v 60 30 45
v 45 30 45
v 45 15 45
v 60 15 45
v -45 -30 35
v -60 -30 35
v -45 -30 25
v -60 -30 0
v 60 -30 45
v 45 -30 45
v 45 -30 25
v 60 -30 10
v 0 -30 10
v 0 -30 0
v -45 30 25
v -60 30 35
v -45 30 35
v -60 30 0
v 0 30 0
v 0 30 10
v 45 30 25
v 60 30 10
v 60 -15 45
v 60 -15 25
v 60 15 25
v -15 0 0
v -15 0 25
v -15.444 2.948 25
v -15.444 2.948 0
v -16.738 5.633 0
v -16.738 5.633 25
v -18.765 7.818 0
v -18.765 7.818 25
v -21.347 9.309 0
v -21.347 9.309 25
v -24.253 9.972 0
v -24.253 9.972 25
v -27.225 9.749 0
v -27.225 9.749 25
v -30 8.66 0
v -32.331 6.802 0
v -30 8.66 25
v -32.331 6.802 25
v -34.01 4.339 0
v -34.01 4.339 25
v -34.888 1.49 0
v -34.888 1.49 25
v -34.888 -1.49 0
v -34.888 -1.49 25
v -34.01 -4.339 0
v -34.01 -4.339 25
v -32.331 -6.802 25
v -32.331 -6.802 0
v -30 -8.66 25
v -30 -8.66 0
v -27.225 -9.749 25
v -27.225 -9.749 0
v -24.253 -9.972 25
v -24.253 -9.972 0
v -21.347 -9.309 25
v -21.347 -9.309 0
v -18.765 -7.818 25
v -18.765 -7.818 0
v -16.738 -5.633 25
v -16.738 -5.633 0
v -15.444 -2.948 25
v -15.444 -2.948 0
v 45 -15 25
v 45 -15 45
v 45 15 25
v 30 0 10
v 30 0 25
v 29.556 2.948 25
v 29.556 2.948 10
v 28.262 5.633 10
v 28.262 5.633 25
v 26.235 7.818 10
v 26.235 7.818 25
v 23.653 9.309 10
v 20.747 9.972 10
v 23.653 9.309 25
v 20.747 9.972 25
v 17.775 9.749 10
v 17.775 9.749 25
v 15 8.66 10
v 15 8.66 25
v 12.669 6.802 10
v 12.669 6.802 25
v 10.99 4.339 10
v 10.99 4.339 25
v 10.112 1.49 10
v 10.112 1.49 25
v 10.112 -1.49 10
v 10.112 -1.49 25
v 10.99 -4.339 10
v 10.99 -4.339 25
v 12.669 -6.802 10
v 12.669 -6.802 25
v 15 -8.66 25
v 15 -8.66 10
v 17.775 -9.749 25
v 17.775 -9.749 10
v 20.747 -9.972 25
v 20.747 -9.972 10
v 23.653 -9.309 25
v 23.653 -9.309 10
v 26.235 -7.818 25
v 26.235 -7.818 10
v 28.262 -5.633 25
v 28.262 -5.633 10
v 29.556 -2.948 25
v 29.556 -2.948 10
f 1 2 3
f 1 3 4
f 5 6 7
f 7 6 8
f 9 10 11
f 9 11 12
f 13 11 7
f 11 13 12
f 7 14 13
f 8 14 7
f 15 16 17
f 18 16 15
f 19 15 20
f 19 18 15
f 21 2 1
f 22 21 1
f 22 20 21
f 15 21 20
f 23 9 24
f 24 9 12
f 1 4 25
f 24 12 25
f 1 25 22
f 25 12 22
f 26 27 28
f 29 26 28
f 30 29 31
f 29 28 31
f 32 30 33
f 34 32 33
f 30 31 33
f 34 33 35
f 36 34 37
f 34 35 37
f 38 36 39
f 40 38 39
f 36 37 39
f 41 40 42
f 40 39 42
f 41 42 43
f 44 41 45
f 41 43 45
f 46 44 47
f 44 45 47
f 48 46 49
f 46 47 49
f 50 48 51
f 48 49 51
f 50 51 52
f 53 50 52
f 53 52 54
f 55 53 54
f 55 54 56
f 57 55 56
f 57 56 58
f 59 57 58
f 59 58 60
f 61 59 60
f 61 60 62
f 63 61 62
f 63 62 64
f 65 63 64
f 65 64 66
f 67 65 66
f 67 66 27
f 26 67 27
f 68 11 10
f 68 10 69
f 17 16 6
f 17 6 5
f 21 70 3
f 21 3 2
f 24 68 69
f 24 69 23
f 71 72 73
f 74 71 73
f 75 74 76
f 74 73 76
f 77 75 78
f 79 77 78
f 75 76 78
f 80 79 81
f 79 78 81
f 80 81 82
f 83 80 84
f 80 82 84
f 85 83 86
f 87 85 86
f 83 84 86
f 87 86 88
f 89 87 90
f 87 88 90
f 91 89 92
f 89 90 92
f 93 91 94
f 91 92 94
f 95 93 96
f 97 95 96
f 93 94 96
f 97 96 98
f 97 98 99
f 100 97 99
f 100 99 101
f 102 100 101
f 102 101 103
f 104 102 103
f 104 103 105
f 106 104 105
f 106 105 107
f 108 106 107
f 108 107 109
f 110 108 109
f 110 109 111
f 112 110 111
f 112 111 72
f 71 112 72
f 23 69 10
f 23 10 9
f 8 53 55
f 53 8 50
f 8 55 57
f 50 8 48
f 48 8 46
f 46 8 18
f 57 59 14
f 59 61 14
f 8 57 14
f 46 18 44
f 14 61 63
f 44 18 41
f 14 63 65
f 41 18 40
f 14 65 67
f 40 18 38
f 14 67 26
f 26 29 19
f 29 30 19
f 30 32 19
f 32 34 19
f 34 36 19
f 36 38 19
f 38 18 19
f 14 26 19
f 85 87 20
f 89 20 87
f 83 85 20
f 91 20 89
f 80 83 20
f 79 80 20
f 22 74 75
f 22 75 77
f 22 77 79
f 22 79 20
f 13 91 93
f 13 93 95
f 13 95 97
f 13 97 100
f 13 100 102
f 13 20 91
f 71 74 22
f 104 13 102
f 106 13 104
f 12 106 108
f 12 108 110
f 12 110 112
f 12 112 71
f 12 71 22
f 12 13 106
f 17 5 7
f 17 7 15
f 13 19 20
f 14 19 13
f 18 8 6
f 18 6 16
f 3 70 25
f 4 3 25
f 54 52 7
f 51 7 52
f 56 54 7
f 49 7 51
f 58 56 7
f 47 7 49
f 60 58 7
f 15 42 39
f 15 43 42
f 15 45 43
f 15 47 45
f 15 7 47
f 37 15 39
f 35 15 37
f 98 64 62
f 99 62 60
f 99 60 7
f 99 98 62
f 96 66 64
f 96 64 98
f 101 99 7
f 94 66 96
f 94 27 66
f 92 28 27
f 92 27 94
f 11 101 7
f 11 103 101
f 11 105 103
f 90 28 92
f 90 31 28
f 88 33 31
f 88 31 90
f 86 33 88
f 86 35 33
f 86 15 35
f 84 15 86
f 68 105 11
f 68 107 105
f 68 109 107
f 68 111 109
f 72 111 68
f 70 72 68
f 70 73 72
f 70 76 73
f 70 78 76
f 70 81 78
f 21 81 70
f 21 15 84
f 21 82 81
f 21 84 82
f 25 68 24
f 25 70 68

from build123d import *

# Parameters (mm, degrees)
SKETCH_W        = 120
SKETCH_H        = 60
PAD_DEPTH       = 35
SKETCH001_W     = 122.740021
SKETCH001_H     = 89.853363
POCKET_DEPTH    = 10
SKETCH002_W     = 72.220016
SKETCH002_H     = 101.200035
POCKET001_DEPTH = 10
SKETCH003_W     = 15
SKETCH003_H     = 15
PAD001_DEPTH    = 20
SKETCH004_R     = 10
POCKET002_DEPTH = 25.001


with BuildPart() as part:
    # Sketch → Pad (new body)
    with BuildSketch(Plane.XY):
        Rectangle(SKETCH_W, SKETCH_H)
    extrude(amount=PAD_DEPTH)

    # Sketch001 → Pocket (cut)
    with BuildSketch(Plane.XY.offset(35)):
        with Locations((16.37001, -4.44667)):
            Rectangle(SKETCH001_W, SKETCH001_H)
    extrude(amount=-POCKET_DEPTH, mode=Mode.SUBTRACT)

    # Sketch002 → Pocket001 (cut)
    with BuildSketch(Plane(origin=(0, 0, 0), x_dir=(1, 0, 0), z_dir=(0, 0, -1))):
        with Locations((36.110008, 2.760006)):
            Rectangle(SKETCH002_W, SKETCH002_H)
    extrude(amount=-POCKET001_DEPTH, mode=Mode.SUBTRACT)

    # Sketch003 → Pad001 (new body)
    with BuildSketch(Plane.XY.offset(25)):
        with Locations((52.5, 22.5)):
            Rectangle(SKETCH003_W, SKETCH003_H)
        with Locations((52.5, -22.5)):
            Rectangle(SKETCH003_W, SKETCH003_H)
    extrude(amount=PAD001_DEPTH)

    # Sketch004 → Pocket002 (cut, through all)
    with BuildSketch(Plane.XY.offset(25)):
        with Locations((-25, 0)):
            Circle(SKETCH004_R)
        with Locations((20, 0)):
            Circle(SKETCH004_R)
    extrude(amount=-POCKET002_DEPTH, mode=Mode.SUBTRACT)


solid = part.part
